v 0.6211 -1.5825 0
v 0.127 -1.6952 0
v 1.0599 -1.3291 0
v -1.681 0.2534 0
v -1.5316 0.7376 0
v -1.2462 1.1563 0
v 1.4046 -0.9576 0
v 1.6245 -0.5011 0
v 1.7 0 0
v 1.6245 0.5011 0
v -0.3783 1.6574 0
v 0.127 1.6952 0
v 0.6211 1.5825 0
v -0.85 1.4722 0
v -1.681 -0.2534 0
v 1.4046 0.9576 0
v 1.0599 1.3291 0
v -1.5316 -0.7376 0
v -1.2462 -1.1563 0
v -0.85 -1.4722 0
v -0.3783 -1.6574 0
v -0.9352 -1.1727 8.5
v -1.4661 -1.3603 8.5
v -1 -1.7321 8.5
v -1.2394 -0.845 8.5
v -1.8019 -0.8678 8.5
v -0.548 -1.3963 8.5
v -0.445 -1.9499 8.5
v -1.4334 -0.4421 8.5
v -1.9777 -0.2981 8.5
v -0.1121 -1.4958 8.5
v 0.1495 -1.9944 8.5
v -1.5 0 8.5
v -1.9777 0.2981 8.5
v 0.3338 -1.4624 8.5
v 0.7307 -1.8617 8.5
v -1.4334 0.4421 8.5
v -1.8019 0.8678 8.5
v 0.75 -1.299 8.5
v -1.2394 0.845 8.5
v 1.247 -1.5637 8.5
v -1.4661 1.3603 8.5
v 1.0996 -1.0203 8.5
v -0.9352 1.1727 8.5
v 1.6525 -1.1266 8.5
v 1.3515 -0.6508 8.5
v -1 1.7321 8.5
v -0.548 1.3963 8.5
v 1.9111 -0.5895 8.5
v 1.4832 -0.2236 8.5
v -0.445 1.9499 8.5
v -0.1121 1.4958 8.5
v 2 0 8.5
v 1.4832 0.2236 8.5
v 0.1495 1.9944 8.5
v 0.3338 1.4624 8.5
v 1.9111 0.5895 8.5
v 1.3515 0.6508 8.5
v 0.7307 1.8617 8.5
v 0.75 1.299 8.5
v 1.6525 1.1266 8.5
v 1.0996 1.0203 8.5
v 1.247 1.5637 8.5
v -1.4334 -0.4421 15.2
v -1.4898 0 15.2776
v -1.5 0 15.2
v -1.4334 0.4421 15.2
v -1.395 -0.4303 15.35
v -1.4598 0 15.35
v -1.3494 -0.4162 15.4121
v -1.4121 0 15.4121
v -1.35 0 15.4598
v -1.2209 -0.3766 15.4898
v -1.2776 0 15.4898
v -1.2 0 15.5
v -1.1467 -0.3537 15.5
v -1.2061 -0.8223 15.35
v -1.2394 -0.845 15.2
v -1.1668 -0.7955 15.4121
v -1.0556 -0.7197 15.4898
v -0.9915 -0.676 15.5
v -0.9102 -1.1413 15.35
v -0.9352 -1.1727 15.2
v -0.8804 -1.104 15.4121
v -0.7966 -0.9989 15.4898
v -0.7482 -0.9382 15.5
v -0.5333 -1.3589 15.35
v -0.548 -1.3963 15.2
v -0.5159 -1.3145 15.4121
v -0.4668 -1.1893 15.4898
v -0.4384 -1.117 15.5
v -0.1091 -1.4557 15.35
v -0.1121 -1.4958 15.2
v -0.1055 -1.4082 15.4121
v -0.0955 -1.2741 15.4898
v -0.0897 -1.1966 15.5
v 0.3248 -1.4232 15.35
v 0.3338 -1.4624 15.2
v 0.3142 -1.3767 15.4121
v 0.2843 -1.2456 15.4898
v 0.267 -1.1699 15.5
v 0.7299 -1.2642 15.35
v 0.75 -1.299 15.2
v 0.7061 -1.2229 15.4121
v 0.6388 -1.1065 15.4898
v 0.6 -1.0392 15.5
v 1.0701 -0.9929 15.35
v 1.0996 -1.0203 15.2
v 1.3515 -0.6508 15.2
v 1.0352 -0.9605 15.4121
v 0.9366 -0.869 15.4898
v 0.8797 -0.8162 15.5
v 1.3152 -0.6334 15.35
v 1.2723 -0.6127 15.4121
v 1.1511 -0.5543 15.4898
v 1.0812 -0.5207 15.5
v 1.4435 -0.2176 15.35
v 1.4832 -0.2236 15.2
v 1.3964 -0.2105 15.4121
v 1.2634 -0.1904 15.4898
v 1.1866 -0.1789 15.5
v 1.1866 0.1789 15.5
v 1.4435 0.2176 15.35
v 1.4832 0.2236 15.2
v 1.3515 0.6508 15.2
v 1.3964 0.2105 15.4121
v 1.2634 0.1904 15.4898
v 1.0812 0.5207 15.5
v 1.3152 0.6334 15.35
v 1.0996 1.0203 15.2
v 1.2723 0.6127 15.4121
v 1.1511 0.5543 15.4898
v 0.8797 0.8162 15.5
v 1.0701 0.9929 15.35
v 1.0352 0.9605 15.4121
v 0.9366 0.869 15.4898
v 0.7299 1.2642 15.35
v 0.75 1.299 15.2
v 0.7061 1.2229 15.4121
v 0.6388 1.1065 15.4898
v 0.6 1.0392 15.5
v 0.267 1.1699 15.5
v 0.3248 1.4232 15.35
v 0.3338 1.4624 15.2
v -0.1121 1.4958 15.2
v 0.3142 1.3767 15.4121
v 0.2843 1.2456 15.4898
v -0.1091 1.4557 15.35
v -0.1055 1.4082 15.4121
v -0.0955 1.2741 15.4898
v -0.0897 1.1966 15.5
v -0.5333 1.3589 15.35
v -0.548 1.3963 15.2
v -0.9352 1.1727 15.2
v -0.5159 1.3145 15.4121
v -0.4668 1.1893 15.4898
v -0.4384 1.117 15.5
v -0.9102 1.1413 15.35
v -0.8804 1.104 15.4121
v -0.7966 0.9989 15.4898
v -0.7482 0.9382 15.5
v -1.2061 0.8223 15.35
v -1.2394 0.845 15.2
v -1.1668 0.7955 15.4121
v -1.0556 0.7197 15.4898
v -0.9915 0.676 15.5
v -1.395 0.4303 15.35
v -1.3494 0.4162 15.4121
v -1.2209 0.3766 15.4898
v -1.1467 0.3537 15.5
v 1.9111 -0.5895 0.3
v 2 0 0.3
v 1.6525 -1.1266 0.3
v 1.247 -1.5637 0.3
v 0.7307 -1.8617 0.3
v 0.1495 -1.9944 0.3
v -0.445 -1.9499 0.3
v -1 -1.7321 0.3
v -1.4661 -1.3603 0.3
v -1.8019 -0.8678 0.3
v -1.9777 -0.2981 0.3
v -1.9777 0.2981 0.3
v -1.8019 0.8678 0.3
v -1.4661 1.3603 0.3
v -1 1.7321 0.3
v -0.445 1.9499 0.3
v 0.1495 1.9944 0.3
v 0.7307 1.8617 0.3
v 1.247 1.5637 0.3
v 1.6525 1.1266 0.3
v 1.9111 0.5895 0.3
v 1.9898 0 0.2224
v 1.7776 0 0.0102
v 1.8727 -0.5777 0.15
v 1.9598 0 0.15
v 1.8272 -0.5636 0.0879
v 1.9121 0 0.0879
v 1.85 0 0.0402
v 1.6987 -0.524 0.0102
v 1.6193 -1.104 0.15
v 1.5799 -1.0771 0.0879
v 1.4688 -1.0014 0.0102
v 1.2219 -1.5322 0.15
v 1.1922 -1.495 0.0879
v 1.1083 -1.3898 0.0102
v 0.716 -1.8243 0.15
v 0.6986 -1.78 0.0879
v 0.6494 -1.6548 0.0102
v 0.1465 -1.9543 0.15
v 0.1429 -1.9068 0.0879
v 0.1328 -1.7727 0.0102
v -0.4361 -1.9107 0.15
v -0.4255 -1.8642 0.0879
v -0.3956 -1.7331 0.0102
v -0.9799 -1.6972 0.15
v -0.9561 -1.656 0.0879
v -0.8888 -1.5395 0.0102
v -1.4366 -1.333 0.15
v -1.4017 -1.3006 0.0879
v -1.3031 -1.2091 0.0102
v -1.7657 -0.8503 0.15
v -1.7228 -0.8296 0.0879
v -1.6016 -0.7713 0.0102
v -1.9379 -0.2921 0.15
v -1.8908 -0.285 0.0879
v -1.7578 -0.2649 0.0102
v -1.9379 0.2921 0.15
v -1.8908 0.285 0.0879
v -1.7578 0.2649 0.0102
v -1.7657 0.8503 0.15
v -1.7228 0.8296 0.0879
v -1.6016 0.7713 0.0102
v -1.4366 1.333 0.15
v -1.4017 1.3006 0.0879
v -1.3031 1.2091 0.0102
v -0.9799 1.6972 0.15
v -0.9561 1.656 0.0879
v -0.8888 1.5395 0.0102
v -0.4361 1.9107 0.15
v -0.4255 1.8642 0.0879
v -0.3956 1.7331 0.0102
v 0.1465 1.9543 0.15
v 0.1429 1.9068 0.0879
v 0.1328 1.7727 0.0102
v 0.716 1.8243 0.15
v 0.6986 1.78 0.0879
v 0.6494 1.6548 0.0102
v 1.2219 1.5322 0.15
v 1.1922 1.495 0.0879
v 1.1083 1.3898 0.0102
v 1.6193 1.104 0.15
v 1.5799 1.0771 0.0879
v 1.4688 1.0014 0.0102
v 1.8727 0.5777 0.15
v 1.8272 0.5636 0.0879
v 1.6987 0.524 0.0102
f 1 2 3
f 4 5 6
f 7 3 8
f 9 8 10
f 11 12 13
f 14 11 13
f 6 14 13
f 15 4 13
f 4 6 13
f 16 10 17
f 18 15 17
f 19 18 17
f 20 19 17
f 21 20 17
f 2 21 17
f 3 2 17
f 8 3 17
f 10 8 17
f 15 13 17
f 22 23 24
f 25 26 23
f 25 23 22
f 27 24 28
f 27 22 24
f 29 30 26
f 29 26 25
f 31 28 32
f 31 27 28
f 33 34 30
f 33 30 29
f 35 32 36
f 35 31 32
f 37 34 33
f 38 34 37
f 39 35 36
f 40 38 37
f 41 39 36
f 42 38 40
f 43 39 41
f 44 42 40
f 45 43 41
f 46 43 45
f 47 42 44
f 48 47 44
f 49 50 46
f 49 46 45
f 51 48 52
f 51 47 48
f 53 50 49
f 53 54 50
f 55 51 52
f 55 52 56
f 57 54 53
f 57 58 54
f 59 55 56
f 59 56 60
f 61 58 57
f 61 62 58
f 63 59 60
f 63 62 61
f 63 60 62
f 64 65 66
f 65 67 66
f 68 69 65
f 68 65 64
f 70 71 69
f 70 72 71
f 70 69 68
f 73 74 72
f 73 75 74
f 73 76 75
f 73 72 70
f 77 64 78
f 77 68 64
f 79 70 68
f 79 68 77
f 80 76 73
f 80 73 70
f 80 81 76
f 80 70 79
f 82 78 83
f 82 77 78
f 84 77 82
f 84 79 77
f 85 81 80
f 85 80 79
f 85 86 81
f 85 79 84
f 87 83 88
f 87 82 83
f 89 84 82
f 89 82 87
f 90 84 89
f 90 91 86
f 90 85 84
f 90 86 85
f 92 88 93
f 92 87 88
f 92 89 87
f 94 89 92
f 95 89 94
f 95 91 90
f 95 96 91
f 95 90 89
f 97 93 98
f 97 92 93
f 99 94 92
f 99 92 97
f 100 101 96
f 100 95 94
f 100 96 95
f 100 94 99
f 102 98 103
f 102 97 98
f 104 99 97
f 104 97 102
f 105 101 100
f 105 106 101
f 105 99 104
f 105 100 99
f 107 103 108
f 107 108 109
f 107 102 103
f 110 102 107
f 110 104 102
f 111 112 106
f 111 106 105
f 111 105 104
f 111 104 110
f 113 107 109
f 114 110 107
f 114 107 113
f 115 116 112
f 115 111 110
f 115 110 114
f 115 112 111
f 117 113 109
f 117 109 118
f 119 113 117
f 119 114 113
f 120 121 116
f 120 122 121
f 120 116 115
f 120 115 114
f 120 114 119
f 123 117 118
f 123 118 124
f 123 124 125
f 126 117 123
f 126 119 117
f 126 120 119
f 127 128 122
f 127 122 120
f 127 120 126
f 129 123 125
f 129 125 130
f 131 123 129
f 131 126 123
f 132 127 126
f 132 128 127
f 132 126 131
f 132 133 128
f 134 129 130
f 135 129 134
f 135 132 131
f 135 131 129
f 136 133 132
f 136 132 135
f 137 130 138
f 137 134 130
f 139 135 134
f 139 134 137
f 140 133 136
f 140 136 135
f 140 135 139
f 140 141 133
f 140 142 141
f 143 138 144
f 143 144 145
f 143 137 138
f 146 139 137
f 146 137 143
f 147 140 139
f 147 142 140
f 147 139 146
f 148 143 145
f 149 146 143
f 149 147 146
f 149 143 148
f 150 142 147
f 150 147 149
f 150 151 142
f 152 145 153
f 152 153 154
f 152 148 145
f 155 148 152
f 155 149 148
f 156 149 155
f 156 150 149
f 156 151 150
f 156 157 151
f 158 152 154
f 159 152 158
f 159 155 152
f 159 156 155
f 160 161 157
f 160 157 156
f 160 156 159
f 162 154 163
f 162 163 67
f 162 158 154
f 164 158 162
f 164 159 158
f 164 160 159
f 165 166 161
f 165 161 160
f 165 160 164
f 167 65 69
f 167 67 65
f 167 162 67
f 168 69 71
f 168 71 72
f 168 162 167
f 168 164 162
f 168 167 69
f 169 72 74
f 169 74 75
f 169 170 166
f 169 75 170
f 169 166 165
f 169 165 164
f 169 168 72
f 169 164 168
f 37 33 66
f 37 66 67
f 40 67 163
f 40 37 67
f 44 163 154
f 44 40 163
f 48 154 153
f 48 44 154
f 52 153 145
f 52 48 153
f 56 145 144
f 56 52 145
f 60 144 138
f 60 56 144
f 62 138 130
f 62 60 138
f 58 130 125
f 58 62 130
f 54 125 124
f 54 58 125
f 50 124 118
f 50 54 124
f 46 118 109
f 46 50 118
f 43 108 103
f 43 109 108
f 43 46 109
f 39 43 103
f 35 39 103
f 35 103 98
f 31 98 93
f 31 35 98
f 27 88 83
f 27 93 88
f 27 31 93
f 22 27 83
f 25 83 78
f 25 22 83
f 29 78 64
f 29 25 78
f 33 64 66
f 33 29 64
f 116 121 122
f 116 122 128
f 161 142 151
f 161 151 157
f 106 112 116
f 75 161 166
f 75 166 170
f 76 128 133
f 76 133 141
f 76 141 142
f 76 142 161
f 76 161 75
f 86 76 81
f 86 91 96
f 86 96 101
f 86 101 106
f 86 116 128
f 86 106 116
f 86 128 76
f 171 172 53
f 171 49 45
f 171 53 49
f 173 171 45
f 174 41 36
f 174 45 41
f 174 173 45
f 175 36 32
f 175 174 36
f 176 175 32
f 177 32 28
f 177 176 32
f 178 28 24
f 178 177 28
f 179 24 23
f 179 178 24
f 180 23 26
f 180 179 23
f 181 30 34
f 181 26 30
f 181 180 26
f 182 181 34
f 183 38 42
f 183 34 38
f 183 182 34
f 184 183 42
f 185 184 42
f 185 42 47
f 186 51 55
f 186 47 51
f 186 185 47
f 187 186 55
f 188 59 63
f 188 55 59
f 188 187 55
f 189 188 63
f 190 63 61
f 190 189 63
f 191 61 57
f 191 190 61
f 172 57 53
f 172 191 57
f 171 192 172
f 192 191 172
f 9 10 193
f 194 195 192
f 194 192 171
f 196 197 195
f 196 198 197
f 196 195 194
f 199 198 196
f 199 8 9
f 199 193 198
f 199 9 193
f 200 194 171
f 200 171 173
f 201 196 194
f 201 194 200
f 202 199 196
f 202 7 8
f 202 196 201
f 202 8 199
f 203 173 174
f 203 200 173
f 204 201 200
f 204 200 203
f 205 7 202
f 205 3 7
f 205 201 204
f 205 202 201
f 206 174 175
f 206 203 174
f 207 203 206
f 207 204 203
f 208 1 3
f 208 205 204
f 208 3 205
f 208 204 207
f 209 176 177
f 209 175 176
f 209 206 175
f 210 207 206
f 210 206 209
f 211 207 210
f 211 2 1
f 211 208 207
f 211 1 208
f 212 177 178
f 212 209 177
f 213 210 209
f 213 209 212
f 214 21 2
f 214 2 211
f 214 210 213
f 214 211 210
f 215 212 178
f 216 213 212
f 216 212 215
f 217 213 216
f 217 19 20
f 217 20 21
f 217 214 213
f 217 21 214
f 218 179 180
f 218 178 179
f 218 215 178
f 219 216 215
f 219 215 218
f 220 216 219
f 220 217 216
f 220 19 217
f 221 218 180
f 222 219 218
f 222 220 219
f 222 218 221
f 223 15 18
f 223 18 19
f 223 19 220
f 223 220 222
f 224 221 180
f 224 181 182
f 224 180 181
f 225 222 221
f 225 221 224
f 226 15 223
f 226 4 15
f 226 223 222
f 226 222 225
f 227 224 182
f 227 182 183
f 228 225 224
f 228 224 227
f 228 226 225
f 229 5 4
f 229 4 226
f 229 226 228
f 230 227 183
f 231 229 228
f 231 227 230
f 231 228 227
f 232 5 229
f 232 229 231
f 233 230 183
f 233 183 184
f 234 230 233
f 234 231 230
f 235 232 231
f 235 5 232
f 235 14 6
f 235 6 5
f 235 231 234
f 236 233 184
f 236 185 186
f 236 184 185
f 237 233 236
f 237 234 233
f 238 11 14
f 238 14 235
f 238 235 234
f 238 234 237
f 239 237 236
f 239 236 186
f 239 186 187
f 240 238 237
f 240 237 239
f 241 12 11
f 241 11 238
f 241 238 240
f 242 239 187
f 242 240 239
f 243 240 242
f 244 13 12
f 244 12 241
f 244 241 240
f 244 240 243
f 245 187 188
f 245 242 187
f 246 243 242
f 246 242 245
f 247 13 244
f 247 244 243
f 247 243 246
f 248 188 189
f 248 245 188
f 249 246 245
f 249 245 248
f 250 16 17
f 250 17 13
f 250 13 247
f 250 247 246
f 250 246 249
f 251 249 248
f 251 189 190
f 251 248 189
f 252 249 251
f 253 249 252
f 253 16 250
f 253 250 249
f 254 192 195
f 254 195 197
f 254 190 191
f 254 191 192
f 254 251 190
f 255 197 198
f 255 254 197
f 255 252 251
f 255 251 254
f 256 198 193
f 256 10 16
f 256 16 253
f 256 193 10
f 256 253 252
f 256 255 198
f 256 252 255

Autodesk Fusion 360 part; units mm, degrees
sketch "Skizze1" plane through (0, 0, 0) normal (0, 0, 1) x (1, 0, 0)
  circle A0 centre (0, 0) radius 2
  dimension "d1" = 4
extrude "Extrusion1" add sketch "Skizze1" along normal blind 8.5
sketch "Skizze2" plane through (0, 0, 8.5) normal (0, 0, 1) x (-1, 0, 0)
  circle A0 centre (0, 0) radius 2
  circle A1 centre (0, 0) radius 1.5
  dimension "d4" = 3
extrude "Extrusion2" add sketch "Skizze2" along normal blind 7 contours A1
fillet "Abrundung1" radius 0.3 1 edges at (1.3985, 0.5424, 15.5)
fillet "Abrundung2" radius 0.3 1 edges at (-1.8647, -0.7232, 0)
